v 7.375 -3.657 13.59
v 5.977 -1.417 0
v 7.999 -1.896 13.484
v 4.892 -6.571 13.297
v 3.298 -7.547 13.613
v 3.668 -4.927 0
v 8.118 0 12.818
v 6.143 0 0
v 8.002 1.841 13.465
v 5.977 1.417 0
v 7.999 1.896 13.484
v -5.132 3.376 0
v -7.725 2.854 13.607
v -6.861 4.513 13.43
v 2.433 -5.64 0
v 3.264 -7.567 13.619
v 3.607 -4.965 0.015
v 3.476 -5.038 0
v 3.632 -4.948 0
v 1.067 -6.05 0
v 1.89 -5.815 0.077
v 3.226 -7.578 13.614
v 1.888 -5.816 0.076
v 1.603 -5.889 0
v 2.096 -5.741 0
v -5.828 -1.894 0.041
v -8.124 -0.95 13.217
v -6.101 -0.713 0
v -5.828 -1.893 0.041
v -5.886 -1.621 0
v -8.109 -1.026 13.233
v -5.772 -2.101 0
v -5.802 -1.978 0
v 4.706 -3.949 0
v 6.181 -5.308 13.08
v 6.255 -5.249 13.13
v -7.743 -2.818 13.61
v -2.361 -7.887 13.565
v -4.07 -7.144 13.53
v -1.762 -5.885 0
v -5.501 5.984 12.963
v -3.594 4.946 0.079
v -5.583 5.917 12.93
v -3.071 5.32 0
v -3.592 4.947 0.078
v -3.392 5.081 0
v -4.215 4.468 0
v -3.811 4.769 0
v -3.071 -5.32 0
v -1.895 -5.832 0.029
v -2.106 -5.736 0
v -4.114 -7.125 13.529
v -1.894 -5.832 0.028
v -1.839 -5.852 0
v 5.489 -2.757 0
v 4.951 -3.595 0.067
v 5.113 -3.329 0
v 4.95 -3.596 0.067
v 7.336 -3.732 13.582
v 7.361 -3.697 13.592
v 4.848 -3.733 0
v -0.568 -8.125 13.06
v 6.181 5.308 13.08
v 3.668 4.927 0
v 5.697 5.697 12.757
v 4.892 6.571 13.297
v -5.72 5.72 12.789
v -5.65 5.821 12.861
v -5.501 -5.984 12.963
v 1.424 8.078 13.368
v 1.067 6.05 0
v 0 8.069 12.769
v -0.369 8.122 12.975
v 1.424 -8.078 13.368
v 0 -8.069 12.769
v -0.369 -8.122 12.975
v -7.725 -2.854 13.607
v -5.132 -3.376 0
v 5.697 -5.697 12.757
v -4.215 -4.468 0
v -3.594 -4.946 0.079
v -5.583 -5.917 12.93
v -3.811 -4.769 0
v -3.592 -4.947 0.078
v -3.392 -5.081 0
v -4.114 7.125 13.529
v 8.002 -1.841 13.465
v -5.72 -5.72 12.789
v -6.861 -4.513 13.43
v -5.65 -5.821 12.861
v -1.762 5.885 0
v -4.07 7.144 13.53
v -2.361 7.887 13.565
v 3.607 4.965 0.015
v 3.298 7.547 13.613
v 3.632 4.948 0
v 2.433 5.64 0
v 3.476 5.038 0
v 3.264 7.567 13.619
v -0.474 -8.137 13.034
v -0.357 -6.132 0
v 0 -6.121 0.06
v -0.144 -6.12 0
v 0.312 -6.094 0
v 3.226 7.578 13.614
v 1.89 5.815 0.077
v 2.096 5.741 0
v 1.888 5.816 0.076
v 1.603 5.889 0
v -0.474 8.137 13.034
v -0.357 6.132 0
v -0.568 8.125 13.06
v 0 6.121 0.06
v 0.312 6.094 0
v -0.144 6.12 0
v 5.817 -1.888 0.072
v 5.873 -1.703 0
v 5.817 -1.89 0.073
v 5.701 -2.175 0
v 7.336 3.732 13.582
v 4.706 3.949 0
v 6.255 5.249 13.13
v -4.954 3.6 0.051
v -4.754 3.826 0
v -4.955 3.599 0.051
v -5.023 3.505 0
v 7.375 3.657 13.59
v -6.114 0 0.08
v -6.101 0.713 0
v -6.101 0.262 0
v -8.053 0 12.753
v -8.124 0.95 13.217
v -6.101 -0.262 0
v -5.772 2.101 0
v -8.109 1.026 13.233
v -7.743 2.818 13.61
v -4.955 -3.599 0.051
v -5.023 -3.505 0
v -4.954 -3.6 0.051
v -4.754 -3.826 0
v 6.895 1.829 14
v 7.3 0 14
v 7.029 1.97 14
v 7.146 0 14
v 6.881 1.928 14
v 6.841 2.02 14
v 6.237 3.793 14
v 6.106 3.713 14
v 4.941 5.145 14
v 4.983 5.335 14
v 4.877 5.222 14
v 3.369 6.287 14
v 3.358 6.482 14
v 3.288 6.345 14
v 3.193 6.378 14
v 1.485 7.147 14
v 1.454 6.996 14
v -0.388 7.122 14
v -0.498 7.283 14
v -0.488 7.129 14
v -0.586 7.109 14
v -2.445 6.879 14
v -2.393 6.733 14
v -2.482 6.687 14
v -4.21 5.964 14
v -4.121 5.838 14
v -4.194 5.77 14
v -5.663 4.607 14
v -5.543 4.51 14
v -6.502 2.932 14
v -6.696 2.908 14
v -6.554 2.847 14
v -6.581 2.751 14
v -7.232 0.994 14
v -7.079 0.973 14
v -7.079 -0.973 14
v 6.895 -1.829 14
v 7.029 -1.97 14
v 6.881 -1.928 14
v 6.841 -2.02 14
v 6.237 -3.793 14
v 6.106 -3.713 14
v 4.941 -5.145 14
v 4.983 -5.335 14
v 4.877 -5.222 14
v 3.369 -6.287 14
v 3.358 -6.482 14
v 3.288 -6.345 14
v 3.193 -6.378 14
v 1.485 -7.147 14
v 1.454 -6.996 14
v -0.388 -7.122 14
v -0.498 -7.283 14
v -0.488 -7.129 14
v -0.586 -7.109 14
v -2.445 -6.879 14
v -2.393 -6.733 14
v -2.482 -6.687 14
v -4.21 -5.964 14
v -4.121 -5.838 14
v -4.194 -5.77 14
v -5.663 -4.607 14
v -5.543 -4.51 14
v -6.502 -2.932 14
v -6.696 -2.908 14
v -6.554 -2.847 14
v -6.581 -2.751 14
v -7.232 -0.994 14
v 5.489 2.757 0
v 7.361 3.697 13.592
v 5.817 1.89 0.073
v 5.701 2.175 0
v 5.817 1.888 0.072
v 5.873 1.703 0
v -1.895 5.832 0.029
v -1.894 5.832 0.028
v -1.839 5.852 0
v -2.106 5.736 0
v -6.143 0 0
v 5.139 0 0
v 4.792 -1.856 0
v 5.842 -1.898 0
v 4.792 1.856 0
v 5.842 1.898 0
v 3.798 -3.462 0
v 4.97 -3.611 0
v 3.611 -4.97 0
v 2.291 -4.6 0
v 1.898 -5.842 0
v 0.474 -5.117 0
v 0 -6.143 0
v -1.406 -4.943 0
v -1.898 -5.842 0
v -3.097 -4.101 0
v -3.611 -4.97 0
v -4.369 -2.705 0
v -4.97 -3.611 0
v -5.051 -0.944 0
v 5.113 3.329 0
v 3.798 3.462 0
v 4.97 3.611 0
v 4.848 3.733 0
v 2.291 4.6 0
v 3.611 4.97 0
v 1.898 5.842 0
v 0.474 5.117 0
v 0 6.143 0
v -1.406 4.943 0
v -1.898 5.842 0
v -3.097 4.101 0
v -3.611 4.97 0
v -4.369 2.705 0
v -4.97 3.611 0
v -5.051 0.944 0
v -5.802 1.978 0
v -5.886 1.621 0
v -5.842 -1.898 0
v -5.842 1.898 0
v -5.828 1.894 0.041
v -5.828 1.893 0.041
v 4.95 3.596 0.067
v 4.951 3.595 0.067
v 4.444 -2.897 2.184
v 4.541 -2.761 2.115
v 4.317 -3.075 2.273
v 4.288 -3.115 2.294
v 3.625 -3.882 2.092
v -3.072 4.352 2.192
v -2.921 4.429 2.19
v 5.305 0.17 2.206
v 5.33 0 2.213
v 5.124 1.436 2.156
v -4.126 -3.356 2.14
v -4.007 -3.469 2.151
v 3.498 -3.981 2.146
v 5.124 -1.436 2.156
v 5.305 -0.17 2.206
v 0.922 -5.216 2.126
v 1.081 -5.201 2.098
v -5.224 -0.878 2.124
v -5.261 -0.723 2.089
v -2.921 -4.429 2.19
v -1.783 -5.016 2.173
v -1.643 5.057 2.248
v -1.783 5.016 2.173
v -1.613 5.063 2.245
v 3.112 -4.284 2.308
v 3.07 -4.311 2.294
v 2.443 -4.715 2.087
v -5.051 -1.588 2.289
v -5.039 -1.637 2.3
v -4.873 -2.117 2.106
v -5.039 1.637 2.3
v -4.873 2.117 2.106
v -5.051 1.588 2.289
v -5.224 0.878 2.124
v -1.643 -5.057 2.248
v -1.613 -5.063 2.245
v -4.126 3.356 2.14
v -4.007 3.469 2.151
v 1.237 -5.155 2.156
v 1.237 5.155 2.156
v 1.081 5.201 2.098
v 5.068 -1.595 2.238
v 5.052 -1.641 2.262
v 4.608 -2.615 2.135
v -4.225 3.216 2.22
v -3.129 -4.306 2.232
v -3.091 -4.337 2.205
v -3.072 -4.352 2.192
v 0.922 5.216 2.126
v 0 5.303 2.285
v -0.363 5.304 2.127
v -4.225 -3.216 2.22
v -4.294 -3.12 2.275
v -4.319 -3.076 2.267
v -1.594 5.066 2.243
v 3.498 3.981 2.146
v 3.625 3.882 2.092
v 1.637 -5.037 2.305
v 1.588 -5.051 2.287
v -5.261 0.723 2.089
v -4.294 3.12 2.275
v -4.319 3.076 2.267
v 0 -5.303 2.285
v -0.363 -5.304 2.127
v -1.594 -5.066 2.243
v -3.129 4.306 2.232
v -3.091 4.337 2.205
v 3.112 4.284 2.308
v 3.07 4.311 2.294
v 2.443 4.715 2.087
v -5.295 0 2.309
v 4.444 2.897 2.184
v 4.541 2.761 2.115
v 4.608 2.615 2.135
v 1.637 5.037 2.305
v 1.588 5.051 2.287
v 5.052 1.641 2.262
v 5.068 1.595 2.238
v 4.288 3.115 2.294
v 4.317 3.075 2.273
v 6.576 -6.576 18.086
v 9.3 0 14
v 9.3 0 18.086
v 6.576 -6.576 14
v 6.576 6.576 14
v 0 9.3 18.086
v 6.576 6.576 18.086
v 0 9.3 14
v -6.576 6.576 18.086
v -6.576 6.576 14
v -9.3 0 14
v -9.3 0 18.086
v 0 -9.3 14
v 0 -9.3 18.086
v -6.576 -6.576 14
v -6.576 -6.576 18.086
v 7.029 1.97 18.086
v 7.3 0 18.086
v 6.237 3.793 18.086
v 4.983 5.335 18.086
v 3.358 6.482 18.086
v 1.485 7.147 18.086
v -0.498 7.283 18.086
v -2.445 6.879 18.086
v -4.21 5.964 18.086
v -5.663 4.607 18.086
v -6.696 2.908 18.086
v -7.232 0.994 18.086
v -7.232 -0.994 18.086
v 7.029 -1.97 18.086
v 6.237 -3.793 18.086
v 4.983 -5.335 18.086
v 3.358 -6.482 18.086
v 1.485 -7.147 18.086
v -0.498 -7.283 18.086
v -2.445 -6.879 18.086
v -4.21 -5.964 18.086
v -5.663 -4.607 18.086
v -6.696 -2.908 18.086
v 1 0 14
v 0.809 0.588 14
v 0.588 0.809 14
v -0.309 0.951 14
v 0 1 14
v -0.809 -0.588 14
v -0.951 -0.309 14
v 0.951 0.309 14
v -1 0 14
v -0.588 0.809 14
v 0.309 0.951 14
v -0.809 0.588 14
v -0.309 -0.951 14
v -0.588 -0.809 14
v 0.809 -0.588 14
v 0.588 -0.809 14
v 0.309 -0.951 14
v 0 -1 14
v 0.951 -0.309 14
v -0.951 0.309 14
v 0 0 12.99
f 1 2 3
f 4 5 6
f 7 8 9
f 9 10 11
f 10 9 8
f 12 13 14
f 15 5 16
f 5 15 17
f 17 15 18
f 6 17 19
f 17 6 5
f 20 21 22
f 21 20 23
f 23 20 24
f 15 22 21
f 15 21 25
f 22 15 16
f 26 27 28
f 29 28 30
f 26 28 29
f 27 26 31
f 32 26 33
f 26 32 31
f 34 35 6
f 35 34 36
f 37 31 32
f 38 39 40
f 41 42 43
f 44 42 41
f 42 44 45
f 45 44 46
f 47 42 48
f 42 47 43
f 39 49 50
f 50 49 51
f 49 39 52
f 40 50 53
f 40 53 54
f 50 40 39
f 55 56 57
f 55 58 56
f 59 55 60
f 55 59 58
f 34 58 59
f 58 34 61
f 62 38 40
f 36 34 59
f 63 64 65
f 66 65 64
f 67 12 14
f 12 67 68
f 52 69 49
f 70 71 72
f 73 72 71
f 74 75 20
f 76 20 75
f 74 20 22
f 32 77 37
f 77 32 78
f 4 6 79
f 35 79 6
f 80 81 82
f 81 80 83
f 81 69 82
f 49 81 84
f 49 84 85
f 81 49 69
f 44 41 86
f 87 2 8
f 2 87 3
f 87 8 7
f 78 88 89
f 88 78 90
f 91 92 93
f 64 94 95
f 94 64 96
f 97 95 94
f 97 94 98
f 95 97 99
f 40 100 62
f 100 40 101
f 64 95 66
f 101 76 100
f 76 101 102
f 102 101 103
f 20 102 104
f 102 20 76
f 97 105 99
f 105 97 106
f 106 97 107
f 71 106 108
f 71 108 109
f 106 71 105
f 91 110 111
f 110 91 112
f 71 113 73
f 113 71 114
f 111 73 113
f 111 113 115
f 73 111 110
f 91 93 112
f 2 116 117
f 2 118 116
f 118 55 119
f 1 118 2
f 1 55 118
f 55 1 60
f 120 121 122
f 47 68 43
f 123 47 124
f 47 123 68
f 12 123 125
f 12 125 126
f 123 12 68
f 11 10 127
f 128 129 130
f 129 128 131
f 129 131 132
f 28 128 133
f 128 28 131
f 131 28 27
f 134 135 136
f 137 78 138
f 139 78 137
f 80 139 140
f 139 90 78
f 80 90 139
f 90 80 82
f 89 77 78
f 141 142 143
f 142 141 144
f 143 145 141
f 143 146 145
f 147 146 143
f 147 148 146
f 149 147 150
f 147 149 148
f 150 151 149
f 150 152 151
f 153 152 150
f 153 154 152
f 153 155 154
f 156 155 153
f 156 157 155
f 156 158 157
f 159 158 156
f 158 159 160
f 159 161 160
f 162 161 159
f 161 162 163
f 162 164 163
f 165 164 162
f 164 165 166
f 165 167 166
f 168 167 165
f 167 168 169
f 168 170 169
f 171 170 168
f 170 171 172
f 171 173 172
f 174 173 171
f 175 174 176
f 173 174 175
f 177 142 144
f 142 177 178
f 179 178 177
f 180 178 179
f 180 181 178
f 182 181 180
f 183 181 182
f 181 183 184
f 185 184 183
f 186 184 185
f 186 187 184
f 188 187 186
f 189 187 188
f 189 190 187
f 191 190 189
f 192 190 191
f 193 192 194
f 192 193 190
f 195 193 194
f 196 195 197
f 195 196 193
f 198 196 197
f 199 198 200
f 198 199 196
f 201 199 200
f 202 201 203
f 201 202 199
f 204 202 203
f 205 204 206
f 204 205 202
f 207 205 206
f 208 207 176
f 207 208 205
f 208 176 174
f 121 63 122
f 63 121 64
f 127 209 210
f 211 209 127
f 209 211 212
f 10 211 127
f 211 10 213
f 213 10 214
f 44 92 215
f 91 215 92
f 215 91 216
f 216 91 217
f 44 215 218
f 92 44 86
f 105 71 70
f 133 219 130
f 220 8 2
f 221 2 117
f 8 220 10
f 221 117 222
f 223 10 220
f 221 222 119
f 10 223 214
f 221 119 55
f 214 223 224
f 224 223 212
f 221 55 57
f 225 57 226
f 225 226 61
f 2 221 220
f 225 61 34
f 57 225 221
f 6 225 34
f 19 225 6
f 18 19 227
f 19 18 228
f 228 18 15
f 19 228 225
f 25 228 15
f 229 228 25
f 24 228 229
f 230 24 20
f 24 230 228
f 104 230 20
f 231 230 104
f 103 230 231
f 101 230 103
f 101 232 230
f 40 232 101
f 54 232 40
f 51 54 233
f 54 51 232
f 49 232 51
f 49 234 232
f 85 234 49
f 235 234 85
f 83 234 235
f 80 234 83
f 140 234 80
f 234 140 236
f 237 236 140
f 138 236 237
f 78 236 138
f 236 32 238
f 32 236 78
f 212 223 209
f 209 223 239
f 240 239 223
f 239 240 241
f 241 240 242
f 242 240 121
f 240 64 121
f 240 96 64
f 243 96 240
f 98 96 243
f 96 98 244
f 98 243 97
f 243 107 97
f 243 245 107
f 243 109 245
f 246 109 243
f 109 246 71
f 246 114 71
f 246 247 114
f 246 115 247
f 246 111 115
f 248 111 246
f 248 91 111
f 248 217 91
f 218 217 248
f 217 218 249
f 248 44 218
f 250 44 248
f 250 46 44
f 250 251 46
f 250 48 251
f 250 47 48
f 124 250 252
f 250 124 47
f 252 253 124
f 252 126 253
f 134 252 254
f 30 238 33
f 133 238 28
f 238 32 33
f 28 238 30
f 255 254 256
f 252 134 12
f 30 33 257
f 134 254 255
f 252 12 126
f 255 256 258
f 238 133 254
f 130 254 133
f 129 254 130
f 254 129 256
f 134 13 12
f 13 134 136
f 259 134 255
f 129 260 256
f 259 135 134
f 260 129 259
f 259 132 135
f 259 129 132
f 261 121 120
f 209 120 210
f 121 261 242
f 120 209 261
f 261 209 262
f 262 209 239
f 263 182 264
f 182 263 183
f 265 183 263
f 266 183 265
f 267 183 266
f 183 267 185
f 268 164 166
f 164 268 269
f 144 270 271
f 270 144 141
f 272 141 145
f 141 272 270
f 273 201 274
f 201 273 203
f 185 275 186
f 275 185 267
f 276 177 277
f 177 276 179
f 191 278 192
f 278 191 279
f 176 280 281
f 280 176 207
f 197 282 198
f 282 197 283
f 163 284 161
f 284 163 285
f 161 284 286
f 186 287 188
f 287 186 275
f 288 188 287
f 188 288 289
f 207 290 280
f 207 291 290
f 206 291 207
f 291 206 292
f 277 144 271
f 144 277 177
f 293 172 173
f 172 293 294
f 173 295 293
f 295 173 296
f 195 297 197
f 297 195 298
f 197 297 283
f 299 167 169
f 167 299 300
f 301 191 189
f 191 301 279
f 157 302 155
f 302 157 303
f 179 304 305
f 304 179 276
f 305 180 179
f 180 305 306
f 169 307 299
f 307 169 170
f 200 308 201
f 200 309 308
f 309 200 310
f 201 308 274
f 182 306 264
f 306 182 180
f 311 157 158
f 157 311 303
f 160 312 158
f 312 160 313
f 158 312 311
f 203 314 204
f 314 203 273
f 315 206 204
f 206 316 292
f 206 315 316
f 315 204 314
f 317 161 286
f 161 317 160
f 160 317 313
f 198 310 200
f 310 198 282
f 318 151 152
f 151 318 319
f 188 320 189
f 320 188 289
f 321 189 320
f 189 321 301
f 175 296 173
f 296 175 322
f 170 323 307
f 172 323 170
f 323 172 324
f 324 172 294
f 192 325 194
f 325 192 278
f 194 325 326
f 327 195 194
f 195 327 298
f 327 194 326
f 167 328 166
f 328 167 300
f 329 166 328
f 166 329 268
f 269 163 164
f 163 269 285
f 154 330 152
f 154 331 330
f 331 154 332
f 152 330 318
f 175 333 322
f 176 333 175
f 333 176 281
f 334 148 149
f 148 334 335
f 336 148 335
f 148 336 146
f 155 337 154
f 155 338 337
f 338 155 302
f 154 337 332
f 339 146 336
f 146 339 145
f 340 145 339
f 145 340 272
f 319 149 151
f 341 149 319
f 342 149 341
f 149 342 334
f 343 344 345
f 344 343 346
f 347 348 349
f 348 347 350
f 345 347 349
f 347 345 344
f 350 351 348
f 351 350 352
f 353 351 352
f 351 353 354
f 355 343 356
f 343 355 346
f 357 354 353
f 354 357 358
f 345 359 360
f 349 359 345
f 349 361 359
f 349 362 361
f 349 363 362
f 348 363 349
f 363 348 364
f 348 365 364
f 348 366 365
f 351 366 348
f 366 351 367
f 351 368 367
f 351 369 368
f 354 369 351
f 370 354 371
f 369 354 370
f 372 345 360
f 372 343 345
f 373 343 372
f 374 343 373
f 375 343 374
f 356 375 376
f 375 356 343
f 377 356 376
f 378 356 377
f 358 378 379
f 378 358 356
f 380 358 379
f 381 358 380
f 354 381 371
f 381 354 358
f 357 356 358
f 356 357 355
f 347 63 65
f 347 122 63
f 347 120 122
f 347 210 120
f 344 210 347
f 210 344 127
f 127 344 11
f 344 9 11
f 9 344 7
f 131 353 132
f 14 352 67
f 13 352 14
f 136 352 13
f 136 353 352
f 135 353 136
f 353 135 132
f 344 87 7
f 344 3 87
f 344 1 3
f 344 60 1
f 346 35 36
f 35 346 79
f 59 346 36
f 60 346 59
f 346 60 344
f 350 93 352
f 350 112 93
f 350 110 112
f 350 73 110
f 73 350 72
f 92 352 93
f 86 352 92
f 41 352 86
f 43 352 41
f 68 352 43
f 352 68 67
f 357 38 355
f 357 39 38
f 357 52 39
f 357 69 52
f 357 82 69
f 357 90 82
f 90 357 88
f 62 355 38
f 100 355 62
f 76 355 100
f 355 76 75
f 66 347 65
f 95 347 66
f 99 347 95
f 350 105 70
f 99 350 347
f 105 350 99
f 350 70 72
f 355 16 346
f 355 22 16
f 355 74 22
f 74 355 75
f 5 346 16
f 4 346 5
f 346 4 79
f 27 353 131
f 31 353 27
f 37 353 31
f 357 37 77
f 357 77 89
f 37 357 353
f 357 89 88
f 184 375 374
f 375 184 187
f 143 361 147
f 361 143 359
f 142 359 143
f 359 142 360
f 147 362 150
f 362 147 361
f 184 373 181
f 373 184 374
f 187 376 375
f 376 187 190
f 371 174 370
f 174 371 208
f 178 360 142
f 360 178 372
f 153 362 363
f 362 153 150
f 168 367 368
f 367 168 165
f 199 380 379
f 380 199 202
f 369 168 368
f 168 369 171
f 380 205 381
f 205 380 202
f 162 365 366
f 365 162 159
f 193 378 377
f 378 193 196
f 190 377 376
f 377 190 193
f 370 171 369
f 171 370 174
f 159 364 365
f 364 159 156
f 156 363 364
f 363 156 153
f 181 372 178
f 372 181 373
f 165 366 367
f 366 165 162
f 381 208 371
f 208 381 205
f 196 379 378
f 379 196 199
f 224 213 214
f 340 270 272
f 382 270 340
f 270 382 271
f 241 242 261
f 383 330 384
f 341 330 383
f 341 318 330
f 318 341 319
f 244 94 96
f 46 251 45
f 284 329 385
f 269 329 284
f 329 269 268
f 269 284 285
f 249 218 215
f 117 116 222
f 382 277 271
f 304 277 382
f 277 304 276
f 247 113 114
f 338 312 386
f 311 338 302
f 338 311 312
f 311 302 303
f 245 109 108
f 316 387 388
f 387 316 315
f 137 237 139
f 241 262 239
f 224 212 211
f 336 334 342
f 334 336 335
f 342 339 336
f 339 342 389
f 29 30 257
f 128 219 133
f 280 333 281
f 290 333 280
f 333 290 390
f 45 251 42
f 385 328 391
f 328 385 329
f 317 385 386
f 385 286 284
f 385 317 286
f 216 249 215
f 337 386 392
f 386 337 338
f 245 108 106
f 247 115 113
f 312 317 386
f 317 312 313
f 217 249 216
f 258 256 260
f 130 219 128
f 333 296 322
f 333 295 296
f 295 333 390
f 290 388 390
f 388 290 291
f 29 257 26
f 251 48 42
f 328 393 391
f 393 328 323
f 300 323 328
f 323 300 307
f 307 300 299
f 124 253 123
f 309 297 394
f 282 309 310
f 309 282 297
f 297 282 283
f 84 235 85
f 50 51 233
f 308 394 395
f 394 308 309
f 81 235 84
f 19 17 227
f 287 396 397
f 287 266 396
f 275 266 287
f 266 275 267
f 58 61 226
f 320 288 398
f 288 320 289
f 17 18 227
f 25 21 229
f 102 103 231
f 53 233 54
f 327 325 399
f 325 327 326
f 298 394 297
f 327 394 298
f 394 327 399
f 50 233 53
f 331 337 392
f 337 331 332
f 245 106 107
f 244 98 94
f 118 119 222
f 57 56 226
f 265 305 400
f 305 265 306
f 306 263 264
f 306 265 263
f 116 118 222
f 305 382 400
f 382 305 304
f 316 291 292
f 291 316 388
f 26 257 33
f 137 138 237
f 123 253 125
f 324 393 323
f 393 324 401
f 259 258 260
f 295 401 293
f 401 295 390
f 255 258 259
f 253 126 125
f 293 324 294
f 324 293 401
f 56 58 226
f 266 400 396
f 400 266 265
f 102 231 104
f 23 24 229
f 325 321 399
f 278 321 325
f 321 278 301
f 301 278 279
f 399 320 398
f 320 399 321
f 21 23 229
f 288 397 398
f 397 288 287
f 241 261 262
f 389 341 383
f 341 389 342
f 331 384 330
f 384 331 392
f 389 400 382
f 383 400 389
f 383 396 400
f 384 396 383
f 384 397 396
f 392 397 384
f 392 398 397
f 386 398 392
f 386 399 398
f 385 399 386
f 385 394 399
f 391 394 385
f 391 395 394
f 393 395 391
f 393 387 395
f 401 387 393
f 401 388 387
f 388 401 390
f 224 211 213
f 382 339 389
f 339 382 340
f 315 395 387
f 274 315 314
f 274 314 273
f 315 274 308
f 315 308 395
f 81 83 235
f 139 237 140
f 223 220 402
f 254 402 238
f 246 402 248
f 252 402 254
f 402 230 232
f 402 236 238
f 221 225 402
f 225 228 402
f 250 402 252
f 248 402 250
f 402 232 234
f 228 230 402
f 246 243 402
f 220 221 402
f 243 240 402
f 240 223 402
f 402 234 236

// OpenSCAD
//Diameter of the flashlight barrel
BarrelDiameter=14.4; //mm
//Height of the diffuser portion, half barrel diameter makes a good diffuser, twice barrel diameter makes a signal wand...
CapHeight=14;
WallThickness=1; //mm
//Adjustment margin for your printer.
Margin=0.2; //mm
//Cut a cone out of the tip
DoCutout=1;//[0:No,1:Yes]
//Cut a notch out of the side-wall for a lanyard (attached to the flashlight)
NotchWidth=0;//[0:5]
//Cut out a hole to attach a lanyard to the tip itself
LanyardHole=0;//[0:5]
/* [Hidden] */
TipDiameter=BarrelDiameter*10/14; //mm
GripHeight=BarrelDiameter*3/14; //mm
NotchHeight=0.5;//[1:5]
// Facets in the anti-roll portion of the grip.
AntiRoll=8;

difference(){
 union(){
   //Cone Portion:
   difference(){
    cylinder(r1=TipDiameter/2+WallThickness, r2=(BarrelDiameter+Margin)/2+WallThickness,h=CapHeight);
    translate([0,0,WallThickness]) cylinder(r1=TipDiameter/2, r2=(BarrelDiameter+Margin)/2, h=CapHeight);
   }
   //Barrel Grip Portion:
   translate([0,0,CapHeight])
    difference(){
     union(){
      cylinder(r=(BarrelDiameter+Margin)/2+2*WallThickness, h=GripHeight+1, $fn=AntiRoll);
      translate([0,0,-1*((BarrelDiameter+Margin)/2+2*WallThickness)]) cylinder(r2=(BarrelDiameter+Margin)/2+2*WallThickness,r1=0,h=(BarrelDiameter+Margin)/2+2*WallThickness,$fn=AntiRoll);
     }
     translate([0,0,0]) cylinder(r=(BarrelDiameter+Margin)/2, h=GripHeight*10,center=true);
    }
  //Central, light-reflecting cone
  translate([0,0,0]) cylinder(r1=TipDiameter/2+WallThickness, r2=WallThickness, h=CapHeight);
 }
 if ( DoCutout ) translate([0,0,-0.01]) cylinder(r1=TipDiameter/2, r2=0, h=CapHeight-1);
 if ( NotchWidth ) {
  #translate([0,BarrelDiameter/2+WallThickness/2,CapHeight+GripHeight+NotchHeight])
   hull(){
    translate([0,0,NotchHeight]) rotate([90,0,0]) cylinder(r=NotchWidth/2,h=WallThickness*2,$fn=6, center=true);
    translate([0,0,-NotchHeight]) rotate([90,0,0]) cylinder(r=NotchWidth/2,h=WallThickness*2,$fn=6, center=true);
   }
 }
 if ( LanyardHole ){
  # translate([0,-BarrelDiameter/2+WallThickness/2,CapHeight+GripHeight-LanyardHole/2]) rotate([90,22.5,0]) cylinder(r=LanyardHole/2,h=WallThickness*2,$fn=8);
 }
 //translate([-50,-50,30]) cube([100,100,100]);
}

